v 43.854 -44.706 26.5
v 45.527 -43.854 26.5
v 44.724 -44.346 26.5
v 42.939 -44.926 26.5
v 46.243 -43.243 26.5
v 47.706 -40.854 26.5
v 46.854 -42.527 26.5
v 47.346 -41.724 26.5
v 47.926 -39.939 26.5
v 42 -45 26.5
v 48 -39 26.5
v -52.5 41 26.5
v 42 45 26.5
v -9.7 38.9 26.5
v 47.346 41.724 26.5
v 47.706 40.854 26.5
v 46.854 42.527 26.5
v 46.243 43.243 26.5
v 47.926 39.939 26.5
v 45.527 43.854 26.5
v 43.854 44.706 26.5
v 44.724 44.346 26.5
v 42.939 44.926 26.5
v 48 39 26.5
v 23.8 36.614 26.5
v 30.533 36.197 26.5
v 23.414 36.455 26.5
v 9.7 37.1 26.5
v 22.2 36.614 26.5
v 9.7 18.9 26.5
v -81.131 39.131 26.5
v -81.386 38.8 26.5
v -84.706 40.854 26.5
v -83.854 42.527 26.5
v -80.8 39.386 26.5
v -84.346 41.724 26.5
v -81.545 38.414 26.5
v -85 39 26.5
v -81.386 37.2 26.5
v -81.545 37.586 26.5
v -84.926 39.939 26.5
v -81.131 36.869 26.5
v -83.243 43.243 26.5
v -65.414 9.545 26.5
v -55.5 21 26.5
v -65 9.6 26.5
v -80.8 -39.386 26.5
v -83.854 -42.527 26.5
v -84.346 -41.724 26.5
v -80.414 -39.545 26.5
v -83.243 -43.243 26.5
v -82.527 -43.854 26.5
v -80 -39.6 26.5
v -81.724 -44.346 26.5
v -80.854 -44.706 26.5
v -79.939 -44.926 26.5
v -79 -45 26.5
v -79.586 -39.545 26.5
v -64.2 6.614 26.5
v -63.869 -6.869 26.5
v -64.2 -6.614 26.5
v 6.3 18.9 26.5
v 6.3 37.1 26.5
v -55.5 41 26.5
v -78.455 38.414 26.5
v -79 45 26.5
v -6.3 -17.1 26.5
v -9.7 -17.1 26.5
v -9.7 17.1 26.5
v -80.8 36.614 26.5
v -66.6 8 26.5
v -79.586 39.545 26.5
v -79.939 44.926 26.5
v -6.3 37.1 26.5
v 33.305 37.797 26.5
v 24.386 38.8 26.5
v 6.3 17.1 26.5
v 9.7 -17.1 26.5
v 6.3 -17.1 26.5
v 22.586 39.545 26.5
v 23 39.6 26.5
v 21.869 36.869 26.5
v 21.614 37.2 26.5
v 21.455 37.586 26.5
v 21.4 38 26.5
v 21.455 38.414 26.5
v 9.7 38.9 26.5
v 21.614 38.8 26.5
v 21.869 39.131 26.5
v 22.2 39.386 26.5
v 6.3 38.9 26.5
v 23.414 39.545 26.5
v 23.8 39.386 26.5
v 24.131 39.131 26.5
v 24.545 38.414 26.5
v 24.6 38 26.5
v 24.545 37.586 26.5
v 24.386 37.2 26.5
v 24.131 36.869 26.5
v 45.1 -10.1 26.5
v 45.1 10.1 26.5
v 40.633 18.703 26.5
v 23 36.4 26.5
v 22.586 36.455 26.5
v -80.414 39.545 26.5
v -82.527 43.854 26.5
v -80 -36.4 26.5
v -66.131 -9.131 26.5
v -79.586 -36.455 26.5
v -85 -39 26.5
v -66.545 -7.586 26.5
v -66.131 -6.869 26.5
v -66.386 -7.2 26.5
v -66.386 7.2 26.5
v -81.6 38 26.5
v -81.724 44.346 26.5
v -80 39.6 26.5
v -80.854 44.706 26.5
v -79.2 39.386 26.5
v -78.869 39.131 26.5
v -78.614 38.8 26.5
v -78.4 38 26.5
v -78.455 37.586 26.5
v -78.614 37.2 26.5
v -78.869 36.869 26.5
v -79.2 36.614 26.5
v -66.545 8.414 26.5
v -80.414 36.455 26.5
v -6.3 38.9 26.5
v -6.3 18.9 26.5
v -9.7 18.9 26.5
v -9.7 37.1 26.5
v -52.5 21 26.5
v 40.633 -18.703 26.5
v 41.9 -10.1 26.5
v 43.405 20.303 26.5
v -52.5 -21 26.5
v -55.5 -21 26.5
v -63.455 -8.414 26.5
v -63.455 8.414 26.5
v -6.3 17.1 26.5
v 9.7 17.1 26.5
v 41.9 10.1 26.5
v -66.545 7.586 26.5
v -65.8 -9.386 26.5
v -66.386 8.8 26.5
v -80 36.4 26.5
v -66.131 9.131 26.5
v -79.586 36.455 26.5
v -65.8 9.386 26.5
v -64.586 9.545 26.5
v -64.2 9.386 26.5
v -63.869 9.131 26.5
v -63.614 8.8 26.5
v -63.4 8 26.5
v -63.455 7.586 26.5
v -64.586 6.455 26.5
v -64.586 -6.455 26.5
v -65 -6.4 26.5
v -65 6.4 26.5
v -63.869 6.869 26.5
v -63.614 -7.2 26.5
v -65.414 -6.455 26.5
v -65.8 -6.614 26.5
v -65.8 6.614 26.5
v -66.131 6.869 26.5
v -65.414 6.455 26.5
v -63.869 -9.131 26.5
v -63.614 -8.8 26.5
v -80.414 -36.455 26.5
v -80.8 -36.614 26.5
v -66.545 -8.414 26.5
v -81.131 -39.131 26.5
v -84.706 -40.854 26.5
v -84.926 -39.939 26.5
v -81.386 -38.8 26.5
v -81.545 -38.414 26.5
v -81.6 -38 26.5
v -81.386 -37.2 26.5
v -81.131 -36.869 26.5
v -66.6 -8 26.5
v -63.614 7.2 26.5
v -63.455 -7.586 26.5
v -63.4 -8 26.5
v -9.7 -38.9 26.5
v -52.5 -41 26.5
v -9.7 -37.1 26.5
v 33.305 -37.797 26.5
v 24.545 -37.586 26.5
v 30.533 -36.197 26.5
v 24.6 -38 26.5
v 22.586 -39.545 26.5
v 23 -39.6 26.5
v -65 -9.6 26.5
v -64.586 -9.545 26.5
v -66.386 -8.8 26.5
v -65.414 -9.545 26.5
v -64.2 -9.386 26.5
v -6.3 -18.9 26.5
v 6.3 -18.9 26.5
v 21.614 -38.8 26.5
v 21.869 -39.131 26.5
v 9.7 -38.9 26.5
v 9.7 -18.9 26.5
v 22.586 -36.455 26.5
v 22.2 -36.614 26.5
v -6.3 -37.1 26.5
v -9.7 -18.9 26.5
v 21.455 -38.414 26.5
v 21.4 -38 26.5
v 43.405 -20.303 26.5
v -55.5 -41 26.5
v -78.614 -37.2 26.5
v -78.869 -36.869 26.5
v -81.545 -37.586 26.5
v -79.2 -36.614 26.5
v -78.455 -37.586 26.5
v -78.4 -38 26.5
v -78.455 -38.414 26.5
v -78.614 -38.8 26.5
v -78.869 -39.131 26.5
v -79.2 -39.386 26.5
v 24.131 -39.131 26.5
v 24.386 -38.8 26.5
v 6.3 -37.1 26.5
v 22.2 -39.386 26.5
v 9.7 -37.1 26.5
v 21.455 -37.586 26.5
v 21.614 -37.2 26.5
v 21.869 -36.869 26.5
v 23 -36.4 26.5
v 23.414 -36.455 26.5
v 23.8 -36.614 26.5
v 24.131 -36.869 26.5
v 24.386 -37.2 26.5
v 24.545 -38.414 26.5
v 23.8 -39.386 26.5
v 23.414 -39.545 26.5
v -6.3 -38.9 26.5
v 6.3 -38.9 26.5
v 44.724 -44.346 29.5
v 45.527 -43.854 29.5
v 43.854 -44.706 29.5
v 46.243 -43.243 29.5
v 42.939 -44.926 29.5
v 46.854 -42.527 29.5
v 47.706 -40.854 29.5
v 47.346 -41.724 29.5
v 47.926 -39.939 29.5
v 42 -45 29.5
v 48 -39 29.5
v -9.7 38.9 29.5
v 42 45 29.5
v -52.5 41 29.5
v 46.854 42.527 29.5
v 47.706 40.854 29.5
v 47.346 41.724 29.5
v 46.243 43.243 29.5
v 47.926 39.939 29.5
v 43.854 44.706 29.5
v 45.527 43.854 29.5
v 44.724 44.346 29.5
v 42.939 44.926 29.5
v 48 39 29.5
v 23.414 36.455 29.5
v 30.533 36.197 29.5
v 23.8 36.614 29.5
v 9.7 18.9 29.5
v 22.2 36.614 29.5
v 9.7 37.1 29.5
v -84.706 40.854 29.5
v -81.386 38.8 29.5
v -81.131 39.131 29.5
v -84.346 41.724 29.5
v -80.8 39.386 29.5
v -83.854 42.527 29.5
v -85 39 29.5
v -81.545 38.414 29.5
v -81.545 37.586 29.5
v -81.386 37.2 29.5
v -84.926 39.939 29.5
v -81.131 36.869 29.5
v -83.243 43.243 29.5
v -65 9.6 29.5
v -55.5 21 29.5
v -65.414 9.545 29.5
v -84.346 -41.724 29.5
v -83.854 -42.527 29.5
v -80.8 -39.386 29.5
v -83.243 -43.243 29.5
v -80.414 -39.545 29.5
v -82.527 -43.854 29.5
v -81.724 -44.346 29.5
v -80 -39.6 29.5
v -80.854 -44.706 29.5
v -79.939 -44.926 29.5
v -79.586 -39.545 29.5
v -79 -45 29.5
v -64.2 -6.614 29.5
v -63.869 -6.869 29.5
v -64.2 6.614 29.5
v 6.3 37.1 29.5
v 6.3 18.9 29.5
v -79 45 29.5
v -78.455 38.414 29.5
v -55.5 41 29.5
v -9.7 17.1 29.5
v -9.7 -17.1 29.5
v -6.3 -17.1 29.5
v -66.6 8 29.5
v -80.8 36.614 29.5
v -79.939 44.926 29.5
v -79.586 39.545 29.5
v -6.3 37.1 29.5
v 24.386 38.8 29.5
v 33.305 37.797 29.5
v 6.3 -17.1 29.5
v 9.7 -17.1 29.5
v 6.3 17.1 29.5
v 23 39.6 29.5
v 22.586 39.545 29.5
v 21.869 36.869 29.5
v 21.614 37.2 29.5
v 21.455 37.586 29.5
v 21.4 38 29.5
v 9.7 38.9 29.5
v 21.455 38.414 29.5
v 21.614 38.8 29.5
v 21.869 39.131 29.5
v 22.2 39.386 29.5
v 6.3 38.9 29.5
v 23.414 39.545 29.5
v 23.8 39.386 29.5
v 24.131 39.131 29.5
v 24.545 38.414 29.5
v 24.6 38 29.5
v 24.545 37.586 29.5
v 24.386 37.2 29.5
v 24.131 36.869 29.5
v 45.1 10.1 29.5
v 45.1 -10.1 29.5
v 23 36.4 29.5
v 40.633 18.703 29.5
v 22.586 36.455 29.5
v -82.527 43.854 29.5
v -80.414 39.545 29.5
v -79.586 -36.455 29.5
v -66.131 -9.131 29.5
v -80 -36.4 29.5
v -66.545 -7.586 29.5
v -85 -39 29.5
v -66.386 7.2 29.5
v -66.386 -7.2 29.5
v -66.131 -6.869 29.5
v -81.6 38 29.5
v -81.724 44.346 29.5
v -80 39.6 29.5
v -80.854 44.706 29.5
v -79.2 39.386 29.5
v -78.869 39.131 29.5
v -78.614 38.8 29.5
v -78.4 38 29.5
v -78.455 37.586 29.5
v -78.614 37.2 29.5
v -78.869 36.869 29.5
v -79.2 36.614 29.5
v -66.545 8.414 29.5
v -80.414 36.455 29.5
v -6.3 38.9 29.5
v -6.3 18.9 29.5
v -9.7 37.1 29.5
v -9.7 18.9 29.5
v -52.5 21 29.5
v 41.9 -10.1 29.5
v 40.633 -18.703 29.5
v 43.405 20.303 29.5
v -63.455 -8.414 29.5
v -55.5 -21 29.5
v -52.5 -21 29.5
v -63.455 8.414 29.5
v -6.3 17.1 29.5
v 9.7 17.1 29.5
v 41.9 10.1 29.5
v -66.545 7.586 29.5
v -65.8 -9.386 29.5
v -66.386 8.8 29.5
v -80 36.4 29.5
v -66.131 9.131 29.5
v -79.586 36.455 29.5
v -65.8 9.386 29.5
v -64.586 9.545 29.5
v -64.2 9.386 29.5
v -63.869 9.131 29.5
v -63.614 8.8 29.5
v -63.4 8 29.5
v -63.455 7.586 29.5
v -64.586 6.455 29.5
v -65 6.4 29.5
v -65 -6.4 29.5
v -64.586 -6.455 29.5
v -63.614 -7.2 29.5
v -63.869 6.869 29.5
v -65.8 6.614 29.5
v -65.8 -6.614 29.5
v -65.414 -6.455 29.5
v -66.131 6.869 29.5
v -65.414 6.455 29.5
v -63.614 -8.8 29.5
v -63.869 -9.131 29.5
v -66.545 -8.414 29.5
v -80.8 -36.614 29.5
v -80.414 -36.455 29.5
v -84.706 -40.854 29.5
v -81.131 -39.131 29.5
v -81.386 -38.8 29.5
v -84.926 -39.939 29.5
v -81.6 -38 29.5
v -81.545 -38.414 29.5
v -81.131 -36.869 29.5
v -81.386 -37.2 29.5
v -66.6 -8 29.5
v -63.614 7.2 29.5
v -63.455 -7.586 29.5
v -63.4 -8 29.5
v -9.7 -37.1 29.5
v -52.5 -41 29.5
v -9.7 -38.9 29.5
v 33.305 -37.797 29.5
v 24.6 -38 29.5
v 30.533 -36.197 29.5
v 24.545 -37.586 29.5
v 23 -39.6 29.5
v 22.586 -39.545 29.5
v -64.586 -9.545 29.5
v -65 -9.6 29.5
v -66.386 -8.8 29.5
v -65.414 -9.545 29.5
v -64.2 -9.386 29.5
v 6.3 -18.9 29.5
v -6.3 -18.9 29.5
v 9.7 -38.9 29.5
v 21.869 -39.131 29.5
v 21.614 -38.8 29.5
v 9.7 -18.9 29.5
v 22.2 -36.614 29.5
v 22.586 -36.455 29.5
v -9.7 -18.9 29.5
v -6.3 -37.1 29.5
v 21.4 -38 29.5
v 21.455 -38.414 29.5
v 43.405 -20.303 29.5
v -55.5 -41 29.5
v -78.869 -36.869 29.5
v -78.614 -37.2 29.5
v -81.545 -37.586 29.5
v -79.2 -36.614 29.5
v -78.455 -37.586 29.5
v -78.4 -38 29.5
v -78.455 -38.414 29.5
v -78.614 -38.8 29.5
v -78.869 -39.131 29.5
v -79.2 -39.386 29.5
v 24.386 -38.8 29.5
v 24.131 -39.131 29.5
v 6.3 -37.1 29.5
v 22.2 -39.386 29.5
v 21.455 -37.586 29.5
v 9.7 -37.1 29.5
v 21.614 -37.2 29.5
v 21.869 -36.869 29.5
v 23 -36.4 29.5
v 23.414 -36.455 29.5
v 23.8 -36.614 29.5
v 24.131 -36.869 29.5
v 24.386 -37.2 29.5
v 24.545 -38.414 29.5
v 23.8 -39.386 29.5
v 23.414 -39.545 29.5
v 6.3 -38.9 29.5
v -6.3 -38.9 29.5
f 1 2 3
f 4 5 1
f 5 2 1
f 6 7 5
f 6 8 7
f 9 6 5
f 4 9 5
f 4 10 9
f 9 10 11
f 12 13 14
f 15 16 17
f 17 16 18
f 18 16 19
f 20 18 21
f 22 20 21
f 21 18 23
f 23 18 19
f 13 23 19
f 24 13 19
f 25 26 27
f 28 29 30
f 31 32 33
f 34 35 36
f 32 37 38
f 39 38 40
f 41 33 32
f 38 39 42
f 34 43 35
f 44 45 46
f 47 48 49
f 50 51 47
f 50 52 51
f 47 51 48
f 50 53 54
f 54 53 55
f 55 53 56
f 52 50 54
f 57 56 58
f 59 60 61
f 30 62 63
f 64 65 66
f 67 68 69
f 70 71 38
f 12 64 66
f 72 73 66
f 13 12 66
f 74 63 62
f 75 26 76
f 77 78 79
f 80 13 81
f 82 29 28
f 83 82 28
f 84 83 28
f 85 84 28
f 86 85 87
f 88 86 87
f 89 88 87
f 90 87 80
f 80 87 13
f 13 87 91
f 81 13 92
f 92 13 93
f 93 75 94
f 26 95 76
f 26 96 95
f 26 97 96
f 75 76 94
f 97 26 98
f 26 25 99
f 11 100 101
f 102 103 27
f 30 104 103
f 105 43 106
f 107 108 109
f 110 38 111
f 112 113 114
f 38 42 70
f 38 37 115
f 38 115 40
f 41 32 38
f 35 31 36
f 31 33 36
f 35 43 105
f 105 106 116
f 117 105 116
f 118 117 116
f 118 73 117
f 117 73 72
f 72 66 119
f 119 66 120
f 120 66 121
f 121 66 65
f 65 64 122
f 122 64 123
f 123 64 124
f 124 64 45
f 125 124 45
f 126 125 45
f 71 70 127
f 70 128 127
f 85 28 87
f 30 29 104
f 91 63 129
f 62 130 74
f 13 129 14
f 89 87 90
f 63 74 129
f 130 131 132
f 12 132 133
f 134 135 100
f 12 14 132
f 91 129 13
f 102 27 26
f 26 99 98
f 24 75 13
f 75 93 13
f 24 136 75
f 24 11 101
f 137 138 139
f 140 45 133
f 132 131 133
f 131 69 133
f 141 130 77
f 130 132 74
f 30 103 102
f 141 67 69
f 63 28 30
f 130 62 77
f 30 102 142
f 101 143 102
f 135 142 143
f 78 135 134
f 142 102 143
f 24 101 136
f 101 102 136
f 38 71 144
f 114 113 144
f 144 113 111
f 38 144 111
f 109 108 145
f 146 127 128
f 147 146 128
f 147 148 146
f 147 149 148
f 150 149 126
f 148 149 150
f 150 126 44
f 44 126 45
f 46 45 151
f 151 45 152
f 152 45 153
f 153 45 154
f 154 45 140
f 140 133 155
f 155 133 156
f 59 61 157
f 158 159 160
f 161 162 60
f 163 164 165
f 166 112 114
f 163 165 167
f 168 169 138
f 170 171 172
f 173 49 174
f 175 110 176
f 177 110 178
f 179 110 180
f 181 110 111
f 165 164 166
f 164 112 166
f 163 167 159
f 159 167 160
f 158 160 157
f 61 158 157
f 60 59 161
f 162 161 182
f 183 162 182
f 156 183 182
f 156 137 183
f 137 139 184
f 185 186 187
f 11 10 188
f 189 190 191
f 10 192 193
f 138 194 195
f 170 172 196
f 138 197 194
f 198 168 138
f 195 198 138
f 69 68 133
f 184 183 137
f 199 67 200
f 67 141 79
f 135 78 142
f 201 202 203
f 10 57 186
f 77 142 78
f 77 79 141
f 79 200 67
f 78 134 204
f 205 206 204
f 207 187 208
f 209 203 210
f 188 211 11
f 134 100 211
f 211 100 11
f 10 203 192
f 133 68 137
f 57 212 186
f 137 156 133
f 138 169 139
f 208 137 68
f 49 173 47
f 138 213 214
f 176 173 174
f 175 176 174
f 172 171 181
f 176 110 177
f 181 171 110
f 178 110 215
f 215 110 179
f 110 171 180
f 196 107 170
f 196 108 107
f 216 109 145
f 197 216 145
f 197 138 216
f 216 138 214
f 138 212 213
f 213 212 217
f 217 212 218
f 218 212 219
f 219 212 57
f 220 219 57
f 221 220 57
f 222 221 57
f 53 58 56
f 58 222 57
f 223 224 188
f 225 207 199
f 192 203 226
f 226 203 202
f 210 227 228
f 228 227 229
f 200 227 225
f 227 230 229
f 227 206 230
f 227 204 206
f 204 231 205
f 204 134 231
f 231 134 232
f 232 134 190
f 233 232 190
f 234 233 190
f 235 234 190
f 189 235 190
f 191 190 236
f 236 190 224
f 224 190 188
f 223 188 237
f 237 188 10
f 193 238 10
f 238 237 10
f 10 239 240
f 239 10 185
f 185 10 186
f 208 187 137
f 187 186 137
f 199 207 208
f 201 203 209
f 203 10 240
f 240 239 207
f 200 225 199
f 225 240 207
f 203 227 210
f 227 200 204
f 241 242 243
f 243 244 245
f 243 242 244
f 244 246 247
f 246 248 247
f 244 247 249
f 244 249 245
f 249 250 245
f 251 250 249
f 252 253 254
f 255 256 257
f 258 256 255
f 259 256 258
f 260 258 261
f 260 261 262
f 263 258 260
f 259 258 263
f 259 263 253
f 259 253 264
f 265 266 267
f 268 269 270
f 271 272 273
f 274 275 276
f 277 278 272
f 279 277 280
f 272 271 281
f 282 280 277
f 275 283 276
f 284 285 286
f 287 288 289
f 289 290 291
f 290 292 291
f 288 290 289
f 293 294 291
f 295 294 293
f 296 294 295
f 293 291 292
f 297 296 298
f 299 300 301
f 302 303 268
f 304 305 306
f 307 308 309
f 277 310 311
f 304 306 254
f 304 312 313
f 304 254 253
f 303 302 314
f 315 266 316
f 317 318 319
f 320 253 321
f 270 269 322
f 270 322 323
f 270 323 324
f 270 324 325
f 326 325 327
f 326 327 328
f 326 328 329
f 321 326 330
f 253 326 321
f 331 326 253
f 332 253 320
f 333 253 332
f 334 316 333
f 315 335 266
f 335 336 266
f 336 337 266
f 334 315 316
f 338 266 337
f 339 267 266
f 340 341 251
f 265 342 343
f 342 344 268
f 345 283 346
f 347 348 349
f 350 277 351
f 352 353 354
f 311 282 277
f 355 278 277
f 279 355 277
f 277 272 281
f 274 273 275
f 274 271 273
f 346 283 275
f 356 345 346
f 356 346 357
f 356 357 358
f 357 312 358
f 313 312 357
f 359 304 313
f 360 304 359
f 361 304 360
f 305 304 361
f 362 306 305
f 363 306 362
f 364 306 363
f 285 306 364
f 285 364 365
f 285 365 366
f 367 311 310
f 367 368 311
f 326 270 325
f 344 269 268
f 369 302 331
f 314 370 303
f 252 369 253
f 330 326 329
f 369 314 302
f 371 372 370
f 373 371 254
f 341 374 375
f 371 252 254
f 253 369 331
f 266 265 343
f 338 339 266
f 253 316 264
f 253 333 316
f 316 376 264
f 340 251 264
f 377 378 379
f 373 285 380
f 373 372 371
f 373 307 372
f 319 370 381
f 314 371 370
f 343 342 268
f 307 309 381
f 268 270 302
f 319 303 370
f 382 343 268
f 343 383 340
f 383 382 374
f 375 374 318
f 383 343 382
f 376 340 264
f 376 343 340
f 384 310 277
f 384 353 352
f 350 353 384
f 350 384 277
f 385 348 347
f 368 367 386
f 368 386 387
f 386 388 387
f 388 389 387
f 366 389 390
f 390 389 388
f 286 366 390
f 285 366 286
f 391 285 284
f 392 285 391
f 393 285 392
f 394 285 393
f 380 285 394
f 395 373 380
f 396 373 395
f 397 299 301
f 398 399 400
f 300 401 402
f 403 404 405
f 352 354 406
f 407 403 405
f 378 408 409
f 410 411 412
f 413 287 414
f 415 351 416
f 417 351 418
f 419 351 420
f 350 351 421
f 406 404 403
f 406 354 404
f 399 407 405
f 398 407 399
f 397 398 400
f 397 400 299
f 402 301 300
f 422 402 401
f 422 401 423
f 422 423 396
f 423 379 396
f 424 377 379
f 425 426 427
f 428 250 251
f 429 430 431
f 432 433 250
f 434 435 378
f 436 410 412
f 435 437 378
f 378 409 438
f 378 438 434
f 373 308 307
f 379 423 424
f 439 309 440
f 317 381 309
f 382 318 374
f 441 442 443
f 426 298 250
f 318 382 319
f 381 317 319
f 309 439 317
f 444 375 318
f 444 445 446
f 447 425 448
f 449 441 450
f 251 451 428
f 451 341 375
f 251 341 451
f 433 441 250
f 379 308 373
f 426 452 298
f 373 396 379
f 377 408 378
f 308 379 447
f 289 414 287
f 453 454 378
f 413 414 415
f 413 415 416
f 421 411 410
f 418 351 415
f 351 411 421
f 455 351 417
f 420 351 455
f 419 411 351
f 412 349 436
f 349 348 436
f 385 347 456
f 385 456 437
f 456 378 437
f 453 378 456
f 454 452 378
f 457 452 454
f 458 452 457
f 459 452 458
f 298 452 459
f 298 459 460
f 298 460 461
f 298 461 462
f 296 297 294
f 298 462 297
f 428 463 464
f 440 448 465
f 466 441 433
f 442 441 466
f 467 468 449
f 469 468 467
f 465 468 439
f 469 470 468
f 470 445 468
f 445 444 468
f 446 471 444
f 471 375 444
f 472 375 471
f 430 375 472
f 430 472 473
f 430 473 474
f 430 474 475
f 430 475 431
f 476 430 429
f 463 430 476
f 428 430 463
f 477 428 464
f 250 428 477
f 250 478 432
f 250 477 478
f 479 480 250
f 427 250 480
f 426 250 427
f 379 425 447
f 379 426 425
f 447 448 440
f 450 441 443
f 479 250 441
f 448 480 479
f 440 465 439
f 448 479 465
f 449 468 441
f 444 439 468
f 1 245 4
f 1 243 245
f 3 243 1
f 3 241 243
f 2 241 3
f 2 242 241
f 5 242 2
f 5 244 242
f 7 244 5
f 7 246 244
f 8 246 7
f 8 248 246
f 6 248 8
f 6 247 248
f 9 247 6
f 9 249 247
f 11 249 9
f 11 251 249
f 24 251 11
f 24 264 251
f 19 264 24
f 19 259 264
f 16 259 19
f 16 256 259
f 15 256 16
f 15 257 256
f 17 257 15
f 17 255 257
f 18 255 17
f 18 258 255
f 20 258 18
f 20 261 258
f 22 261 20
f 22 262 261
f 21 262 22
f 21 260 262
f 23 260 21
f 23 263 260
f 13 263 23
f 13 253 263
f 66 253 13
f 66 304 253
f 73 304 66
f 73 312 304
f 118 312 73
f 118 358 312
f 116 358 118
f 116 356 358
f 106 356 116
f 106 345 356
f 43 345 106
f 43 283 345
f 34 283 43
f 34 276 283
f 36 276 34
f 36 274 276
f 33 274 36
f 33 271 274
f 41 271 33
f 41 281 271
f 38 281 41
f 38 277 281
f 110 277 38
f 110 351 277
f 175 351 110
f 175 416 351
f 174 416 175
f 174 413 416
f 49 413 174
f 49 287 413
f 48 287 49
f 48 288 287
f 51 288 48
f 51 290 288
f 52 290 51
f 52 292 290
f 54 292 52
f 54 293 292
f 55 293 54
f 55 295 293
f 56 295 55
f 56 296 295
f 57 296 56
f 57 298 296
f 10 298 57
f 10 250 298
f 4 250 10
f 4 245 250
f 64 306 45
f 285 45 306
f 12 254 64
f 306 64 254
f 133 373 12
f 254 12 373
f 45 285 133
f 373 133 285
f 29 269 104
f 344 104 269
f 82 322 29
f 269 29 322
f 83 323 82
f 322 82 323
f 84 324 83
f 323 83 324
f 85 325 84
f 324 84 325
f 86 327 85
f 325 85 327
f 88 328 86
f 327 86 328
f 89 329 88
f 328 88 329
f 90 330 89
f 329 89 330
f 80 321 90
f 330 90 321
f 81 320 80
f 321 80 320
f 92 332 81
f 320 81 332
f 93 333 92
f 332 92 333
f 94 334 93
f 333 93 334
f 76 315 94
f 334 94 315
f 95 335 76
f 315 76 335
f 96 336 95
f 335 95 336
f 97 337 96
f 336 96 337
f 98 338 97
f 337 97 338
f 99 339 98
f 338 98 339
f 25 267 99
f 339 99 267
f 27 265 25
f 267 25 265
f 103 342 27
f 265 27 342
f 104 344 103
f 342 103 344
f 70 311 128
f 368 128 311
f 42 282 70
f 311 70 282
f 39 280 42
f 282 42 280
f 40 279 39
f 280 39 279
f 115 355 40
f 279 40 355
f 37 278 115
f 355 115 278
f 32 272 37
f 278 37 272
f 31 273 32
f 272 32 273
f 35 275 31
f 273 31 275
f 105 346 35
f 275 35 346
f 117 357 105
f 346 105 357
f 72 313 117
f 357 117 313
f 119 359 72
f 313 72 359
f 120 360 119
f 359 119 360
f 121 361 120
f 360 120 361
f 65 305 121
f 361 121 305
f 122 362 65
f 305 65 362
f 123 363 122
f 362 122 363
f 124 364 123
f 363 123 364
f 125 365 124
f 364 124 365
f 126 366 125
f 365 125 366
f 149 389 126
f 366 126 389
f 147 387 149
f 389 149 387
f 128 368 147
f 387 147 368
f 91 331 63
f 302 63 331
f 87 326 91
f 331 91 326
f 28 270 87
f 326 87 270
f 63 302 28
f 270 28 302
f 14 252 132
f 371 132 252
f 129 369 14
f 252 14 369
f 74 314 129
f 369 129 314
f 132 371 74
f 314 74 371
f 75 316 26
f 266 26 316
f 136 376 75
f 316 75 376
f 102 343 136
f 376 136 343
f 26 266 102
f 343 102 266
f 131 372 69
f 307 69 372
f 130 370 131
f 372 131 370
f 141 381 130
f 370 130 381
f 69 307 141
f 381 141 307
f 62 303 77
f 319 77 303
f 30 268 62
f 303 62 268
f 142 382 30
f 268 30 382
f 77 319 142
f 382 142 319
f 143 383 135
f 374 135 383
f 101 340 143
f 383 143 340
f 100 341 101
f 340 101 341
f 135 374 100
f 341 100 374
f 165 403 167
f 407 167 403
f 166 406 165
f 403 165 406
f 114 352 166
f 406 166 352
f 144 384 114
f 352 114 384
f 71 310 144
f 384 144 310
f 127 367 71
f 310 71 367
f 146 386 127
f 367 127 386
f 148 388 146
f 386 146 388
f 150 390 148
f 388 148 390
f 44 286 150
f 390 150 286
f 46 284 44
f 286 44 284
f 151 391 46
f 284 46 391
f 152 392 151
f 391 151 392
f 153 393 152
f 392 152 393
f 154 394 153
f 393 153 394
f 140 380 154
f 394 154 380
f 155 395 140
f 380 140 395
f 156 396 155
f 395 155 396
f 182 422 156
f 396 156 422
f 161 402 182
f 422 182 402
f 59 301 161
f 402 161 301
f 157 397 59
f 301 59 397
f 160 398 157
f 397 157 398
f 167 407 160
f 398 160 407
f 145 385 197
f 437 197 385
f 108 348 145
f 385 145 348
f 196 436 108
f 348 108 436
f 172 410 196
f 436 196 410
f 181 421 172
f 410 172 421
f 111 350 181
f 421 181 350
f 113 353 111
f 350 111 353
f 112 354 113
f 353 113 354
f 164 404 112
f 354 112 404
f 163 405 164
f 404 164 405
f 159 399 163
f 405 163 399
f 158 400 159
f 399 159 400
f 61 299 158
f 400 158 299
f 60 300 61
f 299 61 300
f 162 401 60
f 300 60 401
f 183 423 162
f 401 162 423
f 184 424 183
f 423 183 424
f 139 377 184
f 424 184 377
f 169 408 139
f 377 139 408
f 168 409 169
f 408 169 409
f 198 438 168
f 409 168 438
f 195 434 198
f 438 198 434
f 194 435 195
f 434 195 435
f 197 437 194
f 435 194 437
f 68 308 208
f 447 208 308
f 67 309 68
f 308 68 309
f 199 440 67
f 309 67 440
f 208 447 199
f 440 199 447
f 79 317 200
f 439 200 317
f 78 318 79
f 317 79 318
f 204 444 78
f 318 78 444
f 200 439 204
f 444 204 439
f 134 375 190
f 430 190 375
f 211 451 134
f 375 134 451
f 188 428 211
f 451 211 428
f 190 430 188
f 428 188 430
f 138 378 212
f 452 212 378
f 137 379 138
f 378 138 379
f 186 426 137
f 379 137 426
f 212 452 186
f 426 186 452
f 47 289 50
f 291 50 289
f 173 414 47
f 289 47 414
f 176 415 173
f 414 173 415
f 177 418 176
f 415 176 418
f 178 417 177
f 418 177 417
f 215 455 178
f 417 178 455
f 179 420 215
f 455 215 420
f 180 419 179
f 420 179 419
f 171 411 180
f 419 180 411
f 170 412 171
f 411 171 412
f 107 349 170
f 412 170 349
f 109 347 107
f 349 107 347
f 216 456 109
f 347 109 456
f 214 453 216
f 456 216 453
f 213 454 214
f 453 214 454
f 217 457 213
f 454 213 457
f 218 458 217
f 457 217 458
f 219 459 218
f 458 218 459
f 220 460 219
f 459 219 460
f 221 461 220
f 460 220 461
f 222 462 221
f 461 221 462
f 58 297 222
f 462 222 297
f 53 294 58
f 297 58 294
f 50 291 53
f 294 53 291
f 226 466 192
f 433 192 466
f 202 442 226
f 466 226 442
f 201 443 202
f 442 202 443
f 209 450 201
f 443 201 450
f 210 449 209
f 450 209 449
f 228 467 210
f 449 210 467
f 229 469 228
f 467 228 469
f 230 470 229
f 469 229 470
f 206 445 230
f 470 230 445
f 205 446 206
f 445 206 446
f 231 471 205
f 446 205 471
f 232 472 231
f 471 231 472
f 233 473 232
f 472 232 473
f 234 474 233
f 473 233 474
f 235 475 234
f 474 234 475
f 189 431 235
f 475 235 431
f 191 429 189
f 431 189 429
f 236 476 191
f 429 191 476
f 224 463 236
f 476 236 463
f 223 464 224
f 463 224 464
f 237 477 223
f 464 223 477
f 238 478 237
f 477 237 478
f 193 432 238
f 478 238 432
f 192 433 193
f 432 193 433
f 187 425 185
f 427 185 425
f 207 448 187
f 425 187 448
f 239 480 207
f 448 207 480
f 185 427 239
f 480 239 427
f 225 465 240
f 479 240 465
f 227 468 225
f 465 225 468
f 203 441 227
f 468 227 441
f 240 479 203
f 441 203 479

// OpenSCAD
// file: lib.scad
// Robot 3B modeli ve lazer kesim sekilleri. Veri (diziler) design/design.py'den uretilir: generated/<varyant>.scad
// Kullanim:  openscad -D 'part="plate_top"' -o cikti.stl design/robot_pico.scad
// part: tum parcalarin adi | "plate_bottom_2d" | "plate_bottom_marks" | "plate_top_2d" | "plate_top_marks" | "bracket_2d"
$fn = 40;

module rrect2d(o) {                       // o = [x0, x1, y0, y1, r]
  r = o[4];
  hull() for (x = [o[0] + r, o[1] - r], y = [o[2] + r, o[3] - r]) translate([x, y]) circle(r);
}
module plate2d(o, holes, slots) {
  difference() {
    rrect2d(o);
    for (h = holes) translate([h[0], h[1]]) circle(d = h[2], $fn = 24);
    for (s = slots) translate([s[0], s[1]]) rotate(s[4]) square([s[2], s[3]], center = true);
  }
}
module marks2d(marks) {                   // yerlesim cizgileri (kazima): ince dikdortgen cercevesi
  for (m = marks) difference() {
    translate([m[0], m[1]]) square([m[2] - m[0], m[3] - m[1]]);
    translate([m[0] + 0.3, m[1] + 0.3]) square([m[2] - m[0] - 0.6, m[3] - m[1] - 0.6]);
  }
}
module plate3d(z, o, holes, slots) {
  translate([0, 0, z[0]]) linear_extrude(height = z[1] - z[0]) plate2d(o, holes, slots);
}
module part3d(p) {
  k = p[0];
  if (k == "box") translate([p[2], p[4], p[6]]) cube([p[3] - p[2], p[5] - p[4], p[7] - p[6]]);
  else if (k == "rbox") translate([p[2], p[3], p[6]]) rotate(p[8]) translate([-p[5] / 2, -p[4] / 2, 0]) cube([p[5], p[4], p[7] - p[6]]);
  else if (k == "cylz") translate([p[2], p[3], p[5]]) cylinder(d = p[4], h = p[6] - p[5]);
  // cyly: ["cyly", ad, cx, cz, y0, y1, d]
  else if (k == "cyly") translate([p[2], p[4], p[3]]) rotate([-90, 0, 0]) cylinder(d = p[6], h = p[5] - p[4]);
  else if (k == "sphere") translate([p[2], p[3], p[4]]) sphere(r = p[5]);
}

module render_part(name) {
  if (name == "plate_bottom_2d") plate2d(OUT_B, HOLES_B, SLOTS_B);
  else if (name == "plate_bottom_marks") marks2d(MARKS_B);
  else if (name == "plate_top_2d") plate2d(OUT_T, HOLES_T, SLOTS_T);
  else if (name == "plate_top_marks") marks2d(MARKS_T);
  else if (name == "bracket_2d") square([BRACKET[0], BRACKET[1]]);
  else if (name == "plate_bottom") plate3d(Z_B, OUT_B, HOLES_B, SLOTS_B);
  else if (name == "plate_top") plate3d(Z_T, OUT_T, HOLES_T, SLOTS_T);
  else for (p = PARTS) if (p[1] == name) part3d(p);
}
// file: generated/pico.scad
// OTOMATIK URETILDI (design/design.py, varyant: pico); elle degistirme.
OUT_B = [[-85, 48, -45, 45, 6]][0];
HOLES_B = [[23, 38, 3.2], [23, -38, 3.2], [-80, 38, 3.2], [-80, -38, 3.2], [-65, 8, 3.2], [-65, -8, 3.2]];
SLOTS_B = [[-8, 18, 3.4, 1.8, 0], [8, 18, 3.4, 1.8, 0], [-8, 38, 3.4, 1.8, 0], [8, 38, 3.4, 1.8, 0], [-8, -18, 3.4, 1.8, 0], [8, -18, 3.4, 1.8, 0], [-8, -38, 3.4, 1.8, 0], [8, -38, 3.4, 1.8, 0], [36.9689, 28.25, 20.2, 3.2, 120], [43.5, 0, 20.2, 3.2, 90], [36.9689, -28.25, 20.2, 3.2, 60], [-54, -31, 20, 3, 90], [-54, 31, 20, 3, 90]];
MARKS_B = [[-83, -26, -25, 26]];
Z_B = [26.5, 29.5];
OUT_T = [[-85, 28, -45, 45, 6]][0];
HOLES_T = [[23, 38, 3.2], [23, -38, 3.2], [-80, 38, 3.2], [-80, -38, 3.2], [-24.5, -5.7, 2.4], [-24.5, 5.7, 2.4], [22.5, -5.7, 2.4], [22.5, 5.7, 2.4]];
SLOTS_T = [[-70, 0, 8, 20, 0]];
MARKS_T = [[-42, 12, -22, 32], [-38, -30, -18, -14], [-69.5, -28.5, -54.5, -11.5]];
Z_T = [49.5, 52.5];
BRACKET = [20, 34];
PARTS = [["cylz", "standoff_0", 23, 38, 6, 29.5, 49.5], ["cylz", "standoff_1", 23, -38, 6, 29.5, 49.5], ["cylz", "standoff_2", -80, 38, 6, 29.5, 49.5], ["cylz", "standoff_3", -80, -38, 6, 29.5, 49.5], ["box", "plate_bottom", -85, 48, -45, 45, 26.5, 29.5], ["box", "plate_top", -85, 28, -45, 45, 49.5, 52.5], ["cyly", "wheel_l", 0, 21.5, 48, 67, 43], ["box", "motor_l", -6, 6, 12, 46, 16.5, 26.5], ["cyly", "wheel_r", 0, 21.5, -67, -48, 43], ["box", "motor_r", -6, 6, -46, -12, 16.5, 26.5], ["sphere", "caster_ball", -65, 0, 10.7, 10.7], ["cylz", "caster_spacer_p", -65, 8, 6, 21.4, 26.5], ["cylz", "caster_spacer_n", -65, -8, 6, 21.4, 26.5], ["rbox", "tof_bracket_left", 36.9689, 28.25, 20, 3, 26.5, 60.5, 30], ["rbox", "tof_left", 39.134, 29.5, 13, 2, 42.5, 60.5, 30], ["rbox", "tof_bracket_center", 43.5, 0, 20, 3, 26.5, 60.5, 0], ["rbox", "tof_center", 46, 0, 13, 2, 42.5, 60.5, 0], ["rbox", "tof_bracket_right", 36.9689, -28.25, 20, 3, 26.5, 60.5, -30], ["rbox", "tof_right", 39.134, -29.5, 13, 2, 42.5, 60.5, -30], ["box", "battery", -83, -25, -26, 26, 29.5, 45.5], ["cylz", "pico_spacer_20", -24.5, -5.7, 4, 52.5, 56.5], ["cylz", "pico_spacer_21", -24.5, 5.7, 4, 52.5, 56.5], ["cylz", "pico_spacer_22", 22.5, -5.7, 4, 52.5, 56.5], ["cylz", "pico_spacer_23", 22.5, 5.7, 4, 52.5, 56.5], ["box", "pico", -26.5, 24.5, -10.5, 10.5, 56.5, 58.5], ["box", "tb6612", -42, -22, 12, 32, 52.5, 55.5], ["box", "mpu6050", -38, -18, -30, -14, 52.5, 55.5], ["box", "regulator", -69.5, -54.5, -28.5, -11.5, 52.5, 56.5]];
// main file
// Robot (pico) 3B modeli. Diziler generated/pico.scad dosyasindan gelir.
include <generated/pico.scad>
include <lib.scad>
part = "plate_bottom";
render_part(part);
